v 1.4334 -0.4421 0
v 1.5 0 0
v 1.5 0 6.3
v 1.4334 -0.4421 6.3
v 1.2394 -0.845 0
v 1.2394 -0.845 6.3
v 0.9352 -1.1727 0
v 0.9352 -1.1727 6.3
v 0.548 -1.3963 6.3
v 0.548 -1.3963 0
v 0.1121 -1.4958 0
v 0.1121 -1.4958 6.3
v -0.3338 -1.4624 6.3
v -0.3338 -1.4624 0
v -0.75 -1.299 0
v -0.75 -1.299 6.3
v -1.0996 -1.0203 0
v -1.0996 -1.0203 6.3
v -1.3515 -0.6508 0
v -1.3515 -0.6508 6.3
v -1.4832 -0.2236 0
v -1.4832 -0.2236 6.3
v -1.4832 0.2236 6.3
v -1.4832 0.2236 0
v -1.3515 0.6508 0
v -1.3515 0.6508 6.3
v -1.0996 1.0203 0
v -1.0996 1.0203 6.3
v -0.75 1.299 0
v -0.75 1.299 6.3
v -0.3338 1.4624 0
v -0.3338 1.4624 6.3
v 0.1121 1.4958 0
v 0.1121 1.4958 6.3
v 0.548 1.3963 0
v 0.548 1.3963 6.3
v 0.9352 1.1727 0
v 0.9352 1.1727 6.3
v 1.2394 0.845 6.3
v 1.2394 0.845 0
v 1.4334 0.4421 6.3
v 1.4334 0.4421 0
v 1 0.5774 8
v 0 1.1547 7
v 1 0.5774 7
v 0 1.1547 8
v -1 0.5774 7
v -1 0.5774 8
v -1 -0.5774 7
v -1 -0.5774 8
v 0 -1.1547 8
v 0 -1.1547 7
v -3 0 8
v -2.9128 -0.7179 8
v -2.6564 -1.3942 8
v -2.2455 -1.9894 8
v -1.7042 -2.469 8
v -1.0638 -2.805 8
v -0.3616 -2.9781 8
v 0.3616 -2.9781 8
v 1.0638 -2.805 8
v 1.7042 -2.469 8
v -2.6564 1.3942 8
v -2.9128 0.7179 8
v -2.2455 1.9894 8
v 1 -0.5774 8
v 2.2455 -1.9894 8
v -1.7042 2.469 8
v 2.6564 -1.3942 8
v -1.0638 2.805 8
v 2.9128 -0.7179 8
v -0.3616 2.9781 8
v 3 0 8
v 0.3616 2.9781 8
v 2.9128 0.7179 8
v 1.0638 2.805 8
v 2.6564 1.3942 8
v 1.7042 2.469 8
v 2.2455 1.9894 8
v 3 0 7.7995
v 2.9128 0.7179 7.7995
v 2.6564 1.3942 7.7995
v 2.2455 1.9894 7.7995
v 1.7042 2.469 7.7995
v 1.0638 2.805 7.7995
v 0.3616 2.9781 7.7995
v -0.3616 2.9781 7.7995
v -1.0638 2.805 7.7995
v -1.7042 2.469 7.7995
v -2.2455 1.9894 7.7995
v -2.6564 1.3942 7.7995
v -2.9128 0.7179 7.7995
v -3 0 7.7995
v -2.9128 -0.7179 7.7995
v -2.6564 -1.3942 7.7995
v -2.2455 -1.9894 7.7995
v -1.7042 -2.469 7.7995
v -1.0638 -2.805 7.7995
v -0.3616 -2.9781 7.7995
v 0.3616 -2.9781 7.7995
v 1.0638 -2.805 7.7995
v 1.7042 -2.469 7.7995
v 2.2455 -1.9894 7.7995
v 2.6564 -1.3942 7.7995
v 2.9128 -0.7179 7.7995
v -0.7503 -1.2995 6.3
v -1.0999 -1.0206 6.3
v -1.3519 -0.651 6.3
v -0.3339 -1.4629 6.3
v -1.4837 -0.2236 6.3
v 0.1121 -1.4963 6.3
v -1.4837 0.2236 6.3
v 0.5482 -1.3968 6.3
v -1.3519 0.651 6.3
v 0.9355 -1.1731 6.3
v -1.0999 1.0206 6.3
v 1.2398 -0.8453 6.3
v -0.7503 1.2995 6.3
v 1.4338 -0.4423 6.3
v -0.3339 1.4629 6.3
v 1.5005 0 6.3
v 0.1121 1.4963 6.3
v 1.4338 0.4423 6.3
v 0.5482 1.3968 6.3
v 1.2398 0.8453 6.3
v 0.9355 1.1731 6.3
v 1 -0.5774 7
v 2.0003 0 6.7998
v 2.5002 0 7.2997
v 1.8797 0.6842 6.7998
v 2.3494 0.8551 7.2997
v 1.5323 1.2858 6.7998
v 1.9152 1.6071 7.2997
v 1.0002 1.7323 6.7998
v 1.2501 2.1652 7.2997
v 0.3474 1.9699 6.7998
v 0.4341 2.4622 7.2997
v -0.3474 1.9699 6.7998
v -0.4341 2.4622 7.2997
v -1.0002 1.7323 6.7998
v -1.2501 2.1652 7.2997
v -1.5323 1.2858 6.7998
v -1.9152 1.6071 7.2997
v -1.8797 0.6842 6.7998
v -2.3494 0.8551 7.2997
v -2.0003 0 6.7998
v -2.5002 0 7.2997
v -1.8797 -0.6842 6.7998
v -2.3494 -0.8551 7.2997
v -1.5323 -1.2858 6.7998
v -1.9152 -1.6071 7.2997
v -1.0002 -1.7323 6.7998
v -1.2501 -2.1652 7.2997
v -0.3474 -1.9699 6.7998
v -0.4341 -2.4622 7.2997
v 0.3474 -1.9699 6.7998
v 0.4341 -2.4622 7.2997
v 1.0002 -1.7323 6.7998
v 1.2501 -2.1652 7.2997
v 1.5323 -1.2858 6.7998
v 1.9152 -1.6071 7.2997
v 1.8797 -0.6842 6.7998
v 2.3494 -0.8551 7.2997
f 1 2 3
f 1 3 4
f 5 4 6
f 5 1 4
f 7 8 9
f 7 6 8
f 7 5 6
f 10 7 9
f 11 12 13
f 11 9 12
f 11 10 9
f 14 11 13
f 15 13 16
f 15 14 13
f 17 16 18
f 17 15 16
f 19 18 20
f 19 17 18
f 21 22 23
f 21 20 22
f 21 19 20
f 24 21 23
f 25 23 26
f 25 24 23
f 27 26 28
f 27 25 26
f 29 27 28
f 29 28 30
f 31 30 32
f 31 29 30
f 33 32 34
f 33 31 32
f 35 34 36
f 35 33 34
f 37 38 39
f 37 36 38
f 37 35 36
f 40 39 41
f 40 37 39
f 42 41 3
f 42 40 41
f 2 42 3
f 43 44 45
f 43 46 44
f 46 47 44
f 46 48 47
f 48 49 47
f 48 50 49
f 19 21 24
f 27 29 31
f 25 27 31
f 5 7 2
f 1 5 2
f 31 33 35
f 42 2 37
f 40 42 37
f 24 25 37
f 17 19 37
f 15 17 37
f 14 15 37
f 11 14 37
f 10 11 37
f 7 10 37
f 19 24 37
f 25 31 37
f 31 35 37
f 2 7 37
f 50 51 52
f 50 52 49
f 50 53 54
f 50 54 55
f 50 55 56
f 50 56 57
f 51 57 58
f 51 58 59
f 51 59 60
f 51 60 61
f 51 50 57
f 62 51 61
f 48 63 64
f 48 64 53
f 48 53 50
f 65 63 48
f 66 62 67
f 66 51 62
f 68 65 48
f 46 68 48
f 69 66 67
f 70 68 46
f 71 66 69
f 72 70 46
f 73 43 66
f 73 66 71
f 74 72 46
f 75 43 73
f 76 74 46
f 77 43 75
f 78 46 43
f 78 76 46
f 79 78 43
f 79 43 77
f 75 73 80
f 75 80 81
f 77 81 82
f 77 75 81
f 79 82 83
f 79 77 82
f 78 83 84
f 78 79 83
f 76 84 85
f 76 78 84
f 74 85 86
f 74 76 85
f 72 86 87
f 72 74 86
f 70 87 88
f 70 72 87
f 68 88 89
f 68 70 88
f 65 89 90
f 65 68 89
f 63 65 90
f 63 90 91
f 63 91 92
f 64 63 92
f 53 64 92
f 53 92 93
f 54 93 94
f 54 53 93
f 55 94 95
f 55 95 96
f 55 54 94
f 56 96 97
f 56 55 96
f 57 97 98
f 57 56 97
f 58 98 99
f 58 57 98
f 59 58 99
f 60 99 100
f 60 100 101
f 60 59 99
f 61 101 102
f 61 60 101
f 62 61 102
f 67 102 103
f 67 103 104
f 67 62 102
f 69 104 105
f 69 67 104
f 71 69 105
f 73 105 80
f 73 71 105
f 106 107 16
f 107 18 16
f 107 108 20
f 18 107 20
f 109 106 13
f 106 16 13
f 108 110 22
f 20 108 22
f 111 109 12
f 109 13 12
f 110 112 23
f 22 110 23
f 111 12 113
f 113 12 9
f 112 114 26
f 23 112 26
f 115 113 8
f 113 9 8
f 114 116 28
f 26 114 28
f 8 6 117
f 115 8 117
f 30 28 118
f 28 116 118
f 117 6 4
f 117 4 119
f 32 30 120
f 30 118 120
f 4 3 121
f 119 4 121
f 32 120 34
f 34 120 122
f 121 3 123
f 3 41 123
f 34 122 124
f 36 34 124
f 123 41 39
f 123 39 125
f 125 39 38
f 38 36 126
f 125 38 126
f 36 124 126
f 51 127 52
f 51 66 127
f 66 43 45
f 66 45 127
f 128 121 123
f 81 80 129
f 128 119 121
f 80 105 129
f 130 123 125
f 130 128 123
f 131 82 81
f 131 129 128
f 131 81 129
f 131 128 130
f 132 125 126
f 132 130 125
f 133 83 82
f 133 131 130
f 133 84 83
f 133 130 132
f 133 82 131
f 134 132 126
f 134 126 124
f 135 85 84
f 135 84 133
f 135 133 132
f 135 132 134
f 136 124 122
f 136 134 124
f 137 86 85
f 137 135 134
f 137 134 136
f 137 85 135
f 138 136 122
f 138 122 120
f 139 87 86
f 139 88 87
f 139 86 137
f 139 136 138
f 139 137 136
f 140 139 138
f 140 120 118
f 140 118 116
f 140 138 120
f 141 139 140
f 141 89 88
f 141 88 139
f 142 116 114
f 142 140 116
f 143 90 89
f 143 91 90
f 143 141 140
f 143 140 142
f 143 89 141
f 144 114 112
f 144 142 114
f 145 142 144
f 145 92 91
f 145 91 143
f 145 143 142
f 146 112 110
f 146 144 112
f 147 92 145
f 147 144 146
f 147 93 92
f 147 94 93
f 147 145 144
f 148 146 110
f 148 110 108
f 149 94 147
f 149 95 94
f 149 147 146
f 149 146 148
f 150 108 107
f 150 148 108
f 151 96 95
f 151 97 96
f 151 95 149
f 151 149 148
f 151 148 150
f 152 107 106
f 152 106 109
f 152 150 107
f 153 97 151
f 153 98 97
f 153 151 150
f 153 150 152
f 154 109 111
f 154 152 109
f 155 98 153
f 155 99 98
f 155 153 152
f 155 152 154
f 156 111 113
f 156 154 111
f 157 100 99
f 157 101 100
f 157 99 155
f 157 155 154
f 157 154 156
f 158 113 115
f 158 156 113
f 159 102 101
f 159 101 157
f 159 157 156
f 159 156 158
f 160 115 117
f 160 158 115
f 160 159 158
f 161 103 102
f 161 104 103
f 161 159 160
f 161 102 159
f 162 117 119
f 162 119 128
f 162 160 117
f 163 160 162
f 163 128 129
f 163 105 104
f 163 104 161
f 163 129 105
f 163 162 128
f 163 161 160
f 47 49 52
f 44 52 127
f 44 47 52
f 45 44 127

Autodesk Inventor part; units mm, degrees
ref_plane "YZ Plane" through (0, 0, 0) normal (1, 0, 0) x (0, 1, 0)
ref_plane "XZ Plane" through (0, 0, 0) normal (0, 1, 0) x (-1, 0, 0)
ref_plane "XY Plane" through (0, 0, 0) normal (0, 0, 1) x (1, 0, 0)
sketch "スケッチ1" plane through (0, 0, 0) normal (0, 0, 1) x (1, 0, 0)
  circle A0 centre (0, 0) radius 1.5
  dimension "d0" = 3
extrude "押し出し1" add sketch "スケッチ1" along normal blind 8
sketch "スケッチ2" plane through (0, 0, 8) normal (0, 0, 1) x (1, 0, 0)
  circle A0 centre (0, 0) radius 1.5 projected
  circle A1 centre (0, 0) radius 3
  line L0 (0, 1.1547) -> (1, 0.5774)
  line L1 (1, 0.5774) -> (1, -0.5774)
  line L2 (1, -0.5774) -> (0, -1.1547)
  line L3 (0, -1.1547) -> (-1, -0.5774)
  line L4 (-1, -0.5774) -> (-1, 0.5774)
  line L5 (-1, 0.5774) -> (0, 1.1547)
  dimension "d3" = 6
  dimension "d6" = 2
extrude "押し出し2" add sketch "スケッチ2" against normal blind 1.7 contours A1
extrude "押し出し3" cut sketch "スケッチ2" against normal blind 1 contours L0 L1 L2 L3 L4 L5
chamfer "面取り1" distance 1.5 angle 45 1 edges at (-3, 0, 6.3)
properties part number "ねじ皿　m3-l8" material "鋼"
